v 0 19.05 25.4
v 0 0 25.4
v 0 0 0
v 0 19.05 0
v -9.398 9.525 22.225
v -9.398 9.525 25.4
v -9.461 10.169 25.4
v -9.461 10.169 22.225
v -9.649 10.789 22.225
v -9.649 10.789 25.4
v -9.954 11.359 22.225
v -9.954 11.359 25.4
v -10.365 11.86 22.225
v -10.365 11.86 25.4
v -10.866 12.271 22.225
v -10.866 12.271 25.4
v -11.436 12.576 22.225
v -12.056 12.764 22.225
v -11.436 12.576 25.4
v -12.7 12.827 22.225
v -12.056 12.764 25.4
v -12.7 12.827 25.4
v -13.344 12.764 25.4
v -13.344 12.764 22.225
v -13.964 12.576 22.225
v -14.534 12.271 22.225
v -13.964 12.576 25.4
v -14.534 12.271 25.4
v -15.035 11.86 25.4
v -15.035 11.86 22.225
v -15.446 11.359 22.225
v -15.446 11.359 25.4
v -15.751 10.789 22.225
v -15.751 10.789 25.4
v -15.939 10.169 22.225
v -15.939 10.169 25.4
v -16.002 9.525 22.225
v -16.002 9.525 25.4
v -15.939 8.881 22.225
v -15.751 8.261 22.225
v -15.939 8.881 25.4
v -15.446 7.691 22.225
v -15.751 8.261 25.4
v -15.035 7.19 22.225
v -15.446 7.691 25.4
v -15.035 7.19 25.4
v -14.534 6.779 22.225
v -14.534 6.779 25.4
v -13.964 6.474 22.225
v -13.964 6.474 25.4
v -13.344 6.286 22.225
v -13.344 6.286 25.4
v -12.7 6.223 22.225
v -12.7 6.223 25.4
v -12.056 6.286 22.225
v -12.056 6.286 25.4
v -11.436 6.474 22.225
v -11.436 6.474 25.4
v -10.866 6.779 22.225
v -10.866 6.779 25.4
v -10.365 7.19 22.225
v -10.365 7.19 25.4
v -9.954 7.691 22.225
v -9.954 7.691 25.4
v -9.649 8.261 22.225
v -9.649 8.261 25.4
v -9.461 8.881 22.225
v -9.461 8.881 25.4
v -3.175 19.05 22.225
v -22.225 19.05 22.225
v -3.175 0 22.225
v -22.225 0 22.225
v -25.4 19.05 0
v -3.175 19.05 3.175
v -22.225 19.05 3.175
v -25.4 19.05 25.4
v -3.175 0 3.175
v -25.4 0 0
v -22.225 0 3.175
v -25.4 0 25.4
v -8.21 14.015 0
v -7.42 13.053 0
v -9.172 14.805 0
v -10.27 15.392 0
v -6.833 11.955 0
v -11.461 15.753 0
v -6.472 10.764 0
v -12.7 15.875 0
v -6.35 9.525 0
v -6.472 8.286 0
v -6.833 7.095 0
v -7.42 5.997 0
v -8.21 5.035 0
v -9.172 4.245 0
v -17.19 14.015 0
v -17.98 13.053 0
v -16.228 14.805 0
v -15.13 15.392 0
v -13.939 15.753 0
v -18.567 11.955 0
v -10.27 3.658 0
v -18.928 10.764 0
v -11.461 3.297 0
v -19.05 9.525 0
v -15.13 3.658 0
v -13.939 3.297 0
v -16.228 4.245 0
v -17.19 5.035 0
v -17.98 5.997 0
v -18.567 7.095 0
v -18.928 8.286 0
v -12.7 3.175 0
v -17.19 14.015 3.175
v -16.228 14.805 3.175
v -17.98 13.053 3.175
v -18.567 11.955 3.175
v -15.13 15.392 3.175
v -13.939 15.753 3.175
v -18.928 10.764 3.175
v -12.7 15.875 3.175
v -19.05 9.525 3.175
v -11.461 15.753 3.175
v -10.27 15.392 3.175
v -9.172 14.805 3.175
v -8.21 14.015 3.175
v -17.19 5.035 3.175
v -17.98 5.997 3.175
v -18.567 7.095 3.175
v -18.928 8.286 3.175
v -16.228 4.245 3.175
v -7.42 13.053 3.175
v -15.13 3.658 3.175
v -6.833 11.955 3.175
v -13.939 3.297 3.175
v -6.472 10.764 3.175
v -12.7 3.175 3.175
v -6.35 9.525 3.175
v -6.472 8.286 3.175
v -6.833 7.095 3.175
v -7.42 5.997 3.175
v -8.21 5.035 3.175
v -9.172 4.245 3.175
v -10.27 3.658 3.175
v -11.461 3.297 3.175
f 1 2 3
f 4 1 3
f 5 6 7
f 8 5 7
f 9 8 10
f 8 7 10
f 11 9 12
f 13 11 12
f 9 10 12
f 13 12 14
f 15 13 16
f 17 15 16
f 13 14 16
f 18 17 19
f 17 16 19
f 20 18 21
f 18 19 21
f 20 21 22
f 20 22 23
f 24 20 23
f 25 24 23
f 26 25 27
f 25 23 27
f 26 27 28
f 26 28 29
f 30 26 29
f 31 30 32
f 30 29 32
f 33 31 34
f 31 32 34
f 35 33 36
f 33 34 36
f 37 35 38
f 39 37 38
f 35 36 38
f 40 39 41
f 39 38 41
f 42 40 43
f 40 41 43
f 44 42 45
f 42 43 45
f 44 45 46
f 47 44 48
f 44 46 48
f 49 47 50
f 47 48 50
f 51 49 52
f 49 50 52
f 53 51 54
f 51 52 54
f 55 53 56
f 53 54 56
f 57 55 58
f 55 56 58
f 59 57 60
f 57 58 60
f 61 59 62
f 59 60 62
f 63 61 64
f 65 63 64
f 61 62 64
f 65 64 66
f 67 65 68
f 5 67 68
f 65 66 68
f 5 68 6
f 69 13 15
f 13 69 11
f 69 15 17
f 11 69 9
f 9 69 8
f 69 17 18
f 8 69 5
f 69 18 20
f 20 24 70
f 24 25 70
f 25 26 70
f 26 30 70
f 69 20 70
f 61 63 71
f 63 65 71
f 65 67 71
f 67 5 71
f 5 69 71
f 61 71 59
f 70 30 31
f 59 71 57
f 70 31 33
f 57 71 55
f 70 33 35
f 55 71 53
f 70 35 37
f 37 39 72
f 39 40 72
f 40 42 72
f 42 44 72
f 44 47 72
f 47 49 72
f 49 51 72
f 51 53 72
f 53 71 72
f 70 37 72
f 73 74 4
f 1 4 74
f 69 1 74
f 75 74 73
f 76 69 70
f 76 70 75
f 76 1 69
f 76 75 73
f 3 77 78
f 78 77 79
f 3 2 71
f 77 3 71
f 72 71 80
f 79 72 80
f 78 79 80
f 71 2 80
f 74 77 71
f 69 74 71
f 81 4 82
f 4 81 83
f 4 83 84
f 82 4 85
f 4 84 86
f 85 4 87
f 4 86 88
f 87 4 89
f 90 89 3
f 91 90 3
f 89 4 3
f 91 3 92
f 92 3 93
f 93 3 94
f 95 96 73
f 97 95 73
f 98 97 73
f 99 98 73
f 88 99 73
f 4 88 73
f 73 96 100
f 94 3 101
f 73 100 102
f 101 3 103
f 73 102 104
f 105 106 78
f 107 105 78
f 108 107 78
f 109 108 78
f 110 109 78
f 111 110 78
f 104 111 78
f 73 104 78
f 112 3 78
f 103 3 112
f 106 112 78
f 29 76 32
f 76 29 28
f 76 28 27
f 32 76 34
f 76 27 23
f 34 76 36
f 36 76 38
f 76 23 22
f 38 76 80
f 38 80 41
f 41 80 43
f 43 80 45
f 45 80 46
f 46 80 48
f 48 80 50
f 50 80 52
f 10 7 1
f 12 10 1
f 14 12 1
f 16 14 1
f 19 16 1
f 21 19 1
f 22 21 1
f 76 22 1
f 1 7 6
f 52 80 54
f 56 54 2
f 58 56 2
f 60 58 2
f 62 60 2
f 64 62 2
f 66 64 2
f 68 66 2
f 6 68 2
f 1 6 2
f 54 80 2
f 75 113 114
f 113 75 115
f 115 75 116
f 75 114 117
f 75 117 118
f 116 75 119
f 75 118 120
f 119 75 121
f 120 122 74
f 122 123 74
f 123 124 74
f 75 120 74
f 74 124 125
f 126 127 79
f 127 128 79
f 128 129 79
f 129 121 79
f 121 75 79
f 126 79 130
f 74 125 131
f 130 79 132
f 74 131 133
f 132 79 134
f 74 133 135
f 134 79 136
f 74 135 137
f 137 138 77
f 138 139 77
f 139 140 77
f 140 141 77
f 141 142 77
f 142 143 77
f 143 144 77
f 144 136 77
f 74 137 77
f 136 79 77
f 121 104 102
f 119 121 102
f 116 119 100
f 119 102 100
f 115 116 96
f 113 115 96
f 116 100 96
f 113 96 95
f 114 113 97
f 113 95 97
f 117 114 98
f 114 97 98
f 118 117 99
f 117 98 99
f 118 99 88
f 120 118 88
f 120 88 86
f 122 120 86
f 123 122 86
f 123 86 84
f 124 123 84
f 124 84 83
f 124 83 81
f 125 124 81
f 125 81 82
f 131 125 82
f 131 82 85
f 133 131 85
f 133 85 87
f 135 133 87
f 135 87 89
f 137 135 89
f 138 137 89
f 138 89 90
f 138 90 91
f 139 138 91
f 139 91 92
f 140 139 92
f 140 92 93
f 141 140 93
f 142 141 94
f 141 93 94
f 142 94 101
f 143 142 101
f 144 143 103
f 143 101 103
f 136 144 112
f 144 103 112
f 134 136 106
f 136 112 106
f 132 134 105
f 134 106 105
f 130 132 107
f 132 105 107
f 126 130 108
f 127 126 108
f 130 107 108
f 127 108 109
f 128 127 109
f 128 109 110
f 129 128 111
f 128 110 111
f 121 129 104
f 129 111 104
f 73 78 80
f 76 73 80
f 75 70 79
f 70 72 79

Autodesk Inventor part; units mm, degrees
ref_plane "YZ Plane" through (0, 0, 0) normal (1, 0, 0) x (0, 1, 0)
ref_plane "XZ Plane" through (0, 0, 0) normal (0, 1, 0) x (-1, 0, 0)
ref_plane "XY Plane" through (0, 0, 0) normal (0, 0, 1) x (1, 0, 0)
sketch "Sketch1" plane through (0, 0, 0) normal (0, 1, 0) x (-1, 0, 0)
  line L0 (0, 0) -> (25.4, 0)
  line L1 (25.4, 0) -> (25.4, 25.4)
  line L2 (25.4, 25.4) -> (0, 25.4)
  line L3 (0, 25.4) -> (0, 0)
  line L4 (3.175, 22.225) -> (22.225, 22.225)
  line L5 (22.225, 22.225) -> (22.225, 3.175)
  line L6 (22.225, 3.175) -> (3.175, 3.175)
  line L7 (3.175, 3.175) -> (3.175, 22.225)
  dimension "d0" = 25.4
  dimension "d1" = 25.4
  dimension "d2" = 3.175
extrude "Extrusion1" add sketch "Sketch1" along normal blind 19.05
sketch "Sketch2" plane through (-25.4, 0, 25.4) normal (0, 0, 1) x (1, 0, 0)
  line L0 (0, 0) -> (25.4, 0) projected
  line L1 (25.4, 0) -> (25.4, 19.05) projected
  line L2 (0, 19.05) -> (25.4, 19.05) projected
  line L3 (0, 0) -> (0, 19.05) projected
  line L4 (0, 9.525) -> (25.4, 9.525) construction
  line L5 (12.7, 19.05) -> (12.7, 0) construction
  circle A0 centre (12.7, 9.525) radius 3.302
  dimension "d5" = 6.604
extrude "Extrusion2" cut sketch "Sketch2" against normal blind 25.4 contours A0
sketch "Sketch3" plane through (0, 0, 0) normal (0, 0, -1) x (-1, 0, 0)
  circle A0 centre (12.7, 9.525) radius 3.302 projected
  circle A1 centre (12.7, 9.525) radius 6.35
  dimension "d9" = 12.7
extrude "Extrusion3" cut sketch "Sketch3" against normal blind 3.175
properties part number "Chassis Part 12 (26x28)" material "Aluminum 6061"
